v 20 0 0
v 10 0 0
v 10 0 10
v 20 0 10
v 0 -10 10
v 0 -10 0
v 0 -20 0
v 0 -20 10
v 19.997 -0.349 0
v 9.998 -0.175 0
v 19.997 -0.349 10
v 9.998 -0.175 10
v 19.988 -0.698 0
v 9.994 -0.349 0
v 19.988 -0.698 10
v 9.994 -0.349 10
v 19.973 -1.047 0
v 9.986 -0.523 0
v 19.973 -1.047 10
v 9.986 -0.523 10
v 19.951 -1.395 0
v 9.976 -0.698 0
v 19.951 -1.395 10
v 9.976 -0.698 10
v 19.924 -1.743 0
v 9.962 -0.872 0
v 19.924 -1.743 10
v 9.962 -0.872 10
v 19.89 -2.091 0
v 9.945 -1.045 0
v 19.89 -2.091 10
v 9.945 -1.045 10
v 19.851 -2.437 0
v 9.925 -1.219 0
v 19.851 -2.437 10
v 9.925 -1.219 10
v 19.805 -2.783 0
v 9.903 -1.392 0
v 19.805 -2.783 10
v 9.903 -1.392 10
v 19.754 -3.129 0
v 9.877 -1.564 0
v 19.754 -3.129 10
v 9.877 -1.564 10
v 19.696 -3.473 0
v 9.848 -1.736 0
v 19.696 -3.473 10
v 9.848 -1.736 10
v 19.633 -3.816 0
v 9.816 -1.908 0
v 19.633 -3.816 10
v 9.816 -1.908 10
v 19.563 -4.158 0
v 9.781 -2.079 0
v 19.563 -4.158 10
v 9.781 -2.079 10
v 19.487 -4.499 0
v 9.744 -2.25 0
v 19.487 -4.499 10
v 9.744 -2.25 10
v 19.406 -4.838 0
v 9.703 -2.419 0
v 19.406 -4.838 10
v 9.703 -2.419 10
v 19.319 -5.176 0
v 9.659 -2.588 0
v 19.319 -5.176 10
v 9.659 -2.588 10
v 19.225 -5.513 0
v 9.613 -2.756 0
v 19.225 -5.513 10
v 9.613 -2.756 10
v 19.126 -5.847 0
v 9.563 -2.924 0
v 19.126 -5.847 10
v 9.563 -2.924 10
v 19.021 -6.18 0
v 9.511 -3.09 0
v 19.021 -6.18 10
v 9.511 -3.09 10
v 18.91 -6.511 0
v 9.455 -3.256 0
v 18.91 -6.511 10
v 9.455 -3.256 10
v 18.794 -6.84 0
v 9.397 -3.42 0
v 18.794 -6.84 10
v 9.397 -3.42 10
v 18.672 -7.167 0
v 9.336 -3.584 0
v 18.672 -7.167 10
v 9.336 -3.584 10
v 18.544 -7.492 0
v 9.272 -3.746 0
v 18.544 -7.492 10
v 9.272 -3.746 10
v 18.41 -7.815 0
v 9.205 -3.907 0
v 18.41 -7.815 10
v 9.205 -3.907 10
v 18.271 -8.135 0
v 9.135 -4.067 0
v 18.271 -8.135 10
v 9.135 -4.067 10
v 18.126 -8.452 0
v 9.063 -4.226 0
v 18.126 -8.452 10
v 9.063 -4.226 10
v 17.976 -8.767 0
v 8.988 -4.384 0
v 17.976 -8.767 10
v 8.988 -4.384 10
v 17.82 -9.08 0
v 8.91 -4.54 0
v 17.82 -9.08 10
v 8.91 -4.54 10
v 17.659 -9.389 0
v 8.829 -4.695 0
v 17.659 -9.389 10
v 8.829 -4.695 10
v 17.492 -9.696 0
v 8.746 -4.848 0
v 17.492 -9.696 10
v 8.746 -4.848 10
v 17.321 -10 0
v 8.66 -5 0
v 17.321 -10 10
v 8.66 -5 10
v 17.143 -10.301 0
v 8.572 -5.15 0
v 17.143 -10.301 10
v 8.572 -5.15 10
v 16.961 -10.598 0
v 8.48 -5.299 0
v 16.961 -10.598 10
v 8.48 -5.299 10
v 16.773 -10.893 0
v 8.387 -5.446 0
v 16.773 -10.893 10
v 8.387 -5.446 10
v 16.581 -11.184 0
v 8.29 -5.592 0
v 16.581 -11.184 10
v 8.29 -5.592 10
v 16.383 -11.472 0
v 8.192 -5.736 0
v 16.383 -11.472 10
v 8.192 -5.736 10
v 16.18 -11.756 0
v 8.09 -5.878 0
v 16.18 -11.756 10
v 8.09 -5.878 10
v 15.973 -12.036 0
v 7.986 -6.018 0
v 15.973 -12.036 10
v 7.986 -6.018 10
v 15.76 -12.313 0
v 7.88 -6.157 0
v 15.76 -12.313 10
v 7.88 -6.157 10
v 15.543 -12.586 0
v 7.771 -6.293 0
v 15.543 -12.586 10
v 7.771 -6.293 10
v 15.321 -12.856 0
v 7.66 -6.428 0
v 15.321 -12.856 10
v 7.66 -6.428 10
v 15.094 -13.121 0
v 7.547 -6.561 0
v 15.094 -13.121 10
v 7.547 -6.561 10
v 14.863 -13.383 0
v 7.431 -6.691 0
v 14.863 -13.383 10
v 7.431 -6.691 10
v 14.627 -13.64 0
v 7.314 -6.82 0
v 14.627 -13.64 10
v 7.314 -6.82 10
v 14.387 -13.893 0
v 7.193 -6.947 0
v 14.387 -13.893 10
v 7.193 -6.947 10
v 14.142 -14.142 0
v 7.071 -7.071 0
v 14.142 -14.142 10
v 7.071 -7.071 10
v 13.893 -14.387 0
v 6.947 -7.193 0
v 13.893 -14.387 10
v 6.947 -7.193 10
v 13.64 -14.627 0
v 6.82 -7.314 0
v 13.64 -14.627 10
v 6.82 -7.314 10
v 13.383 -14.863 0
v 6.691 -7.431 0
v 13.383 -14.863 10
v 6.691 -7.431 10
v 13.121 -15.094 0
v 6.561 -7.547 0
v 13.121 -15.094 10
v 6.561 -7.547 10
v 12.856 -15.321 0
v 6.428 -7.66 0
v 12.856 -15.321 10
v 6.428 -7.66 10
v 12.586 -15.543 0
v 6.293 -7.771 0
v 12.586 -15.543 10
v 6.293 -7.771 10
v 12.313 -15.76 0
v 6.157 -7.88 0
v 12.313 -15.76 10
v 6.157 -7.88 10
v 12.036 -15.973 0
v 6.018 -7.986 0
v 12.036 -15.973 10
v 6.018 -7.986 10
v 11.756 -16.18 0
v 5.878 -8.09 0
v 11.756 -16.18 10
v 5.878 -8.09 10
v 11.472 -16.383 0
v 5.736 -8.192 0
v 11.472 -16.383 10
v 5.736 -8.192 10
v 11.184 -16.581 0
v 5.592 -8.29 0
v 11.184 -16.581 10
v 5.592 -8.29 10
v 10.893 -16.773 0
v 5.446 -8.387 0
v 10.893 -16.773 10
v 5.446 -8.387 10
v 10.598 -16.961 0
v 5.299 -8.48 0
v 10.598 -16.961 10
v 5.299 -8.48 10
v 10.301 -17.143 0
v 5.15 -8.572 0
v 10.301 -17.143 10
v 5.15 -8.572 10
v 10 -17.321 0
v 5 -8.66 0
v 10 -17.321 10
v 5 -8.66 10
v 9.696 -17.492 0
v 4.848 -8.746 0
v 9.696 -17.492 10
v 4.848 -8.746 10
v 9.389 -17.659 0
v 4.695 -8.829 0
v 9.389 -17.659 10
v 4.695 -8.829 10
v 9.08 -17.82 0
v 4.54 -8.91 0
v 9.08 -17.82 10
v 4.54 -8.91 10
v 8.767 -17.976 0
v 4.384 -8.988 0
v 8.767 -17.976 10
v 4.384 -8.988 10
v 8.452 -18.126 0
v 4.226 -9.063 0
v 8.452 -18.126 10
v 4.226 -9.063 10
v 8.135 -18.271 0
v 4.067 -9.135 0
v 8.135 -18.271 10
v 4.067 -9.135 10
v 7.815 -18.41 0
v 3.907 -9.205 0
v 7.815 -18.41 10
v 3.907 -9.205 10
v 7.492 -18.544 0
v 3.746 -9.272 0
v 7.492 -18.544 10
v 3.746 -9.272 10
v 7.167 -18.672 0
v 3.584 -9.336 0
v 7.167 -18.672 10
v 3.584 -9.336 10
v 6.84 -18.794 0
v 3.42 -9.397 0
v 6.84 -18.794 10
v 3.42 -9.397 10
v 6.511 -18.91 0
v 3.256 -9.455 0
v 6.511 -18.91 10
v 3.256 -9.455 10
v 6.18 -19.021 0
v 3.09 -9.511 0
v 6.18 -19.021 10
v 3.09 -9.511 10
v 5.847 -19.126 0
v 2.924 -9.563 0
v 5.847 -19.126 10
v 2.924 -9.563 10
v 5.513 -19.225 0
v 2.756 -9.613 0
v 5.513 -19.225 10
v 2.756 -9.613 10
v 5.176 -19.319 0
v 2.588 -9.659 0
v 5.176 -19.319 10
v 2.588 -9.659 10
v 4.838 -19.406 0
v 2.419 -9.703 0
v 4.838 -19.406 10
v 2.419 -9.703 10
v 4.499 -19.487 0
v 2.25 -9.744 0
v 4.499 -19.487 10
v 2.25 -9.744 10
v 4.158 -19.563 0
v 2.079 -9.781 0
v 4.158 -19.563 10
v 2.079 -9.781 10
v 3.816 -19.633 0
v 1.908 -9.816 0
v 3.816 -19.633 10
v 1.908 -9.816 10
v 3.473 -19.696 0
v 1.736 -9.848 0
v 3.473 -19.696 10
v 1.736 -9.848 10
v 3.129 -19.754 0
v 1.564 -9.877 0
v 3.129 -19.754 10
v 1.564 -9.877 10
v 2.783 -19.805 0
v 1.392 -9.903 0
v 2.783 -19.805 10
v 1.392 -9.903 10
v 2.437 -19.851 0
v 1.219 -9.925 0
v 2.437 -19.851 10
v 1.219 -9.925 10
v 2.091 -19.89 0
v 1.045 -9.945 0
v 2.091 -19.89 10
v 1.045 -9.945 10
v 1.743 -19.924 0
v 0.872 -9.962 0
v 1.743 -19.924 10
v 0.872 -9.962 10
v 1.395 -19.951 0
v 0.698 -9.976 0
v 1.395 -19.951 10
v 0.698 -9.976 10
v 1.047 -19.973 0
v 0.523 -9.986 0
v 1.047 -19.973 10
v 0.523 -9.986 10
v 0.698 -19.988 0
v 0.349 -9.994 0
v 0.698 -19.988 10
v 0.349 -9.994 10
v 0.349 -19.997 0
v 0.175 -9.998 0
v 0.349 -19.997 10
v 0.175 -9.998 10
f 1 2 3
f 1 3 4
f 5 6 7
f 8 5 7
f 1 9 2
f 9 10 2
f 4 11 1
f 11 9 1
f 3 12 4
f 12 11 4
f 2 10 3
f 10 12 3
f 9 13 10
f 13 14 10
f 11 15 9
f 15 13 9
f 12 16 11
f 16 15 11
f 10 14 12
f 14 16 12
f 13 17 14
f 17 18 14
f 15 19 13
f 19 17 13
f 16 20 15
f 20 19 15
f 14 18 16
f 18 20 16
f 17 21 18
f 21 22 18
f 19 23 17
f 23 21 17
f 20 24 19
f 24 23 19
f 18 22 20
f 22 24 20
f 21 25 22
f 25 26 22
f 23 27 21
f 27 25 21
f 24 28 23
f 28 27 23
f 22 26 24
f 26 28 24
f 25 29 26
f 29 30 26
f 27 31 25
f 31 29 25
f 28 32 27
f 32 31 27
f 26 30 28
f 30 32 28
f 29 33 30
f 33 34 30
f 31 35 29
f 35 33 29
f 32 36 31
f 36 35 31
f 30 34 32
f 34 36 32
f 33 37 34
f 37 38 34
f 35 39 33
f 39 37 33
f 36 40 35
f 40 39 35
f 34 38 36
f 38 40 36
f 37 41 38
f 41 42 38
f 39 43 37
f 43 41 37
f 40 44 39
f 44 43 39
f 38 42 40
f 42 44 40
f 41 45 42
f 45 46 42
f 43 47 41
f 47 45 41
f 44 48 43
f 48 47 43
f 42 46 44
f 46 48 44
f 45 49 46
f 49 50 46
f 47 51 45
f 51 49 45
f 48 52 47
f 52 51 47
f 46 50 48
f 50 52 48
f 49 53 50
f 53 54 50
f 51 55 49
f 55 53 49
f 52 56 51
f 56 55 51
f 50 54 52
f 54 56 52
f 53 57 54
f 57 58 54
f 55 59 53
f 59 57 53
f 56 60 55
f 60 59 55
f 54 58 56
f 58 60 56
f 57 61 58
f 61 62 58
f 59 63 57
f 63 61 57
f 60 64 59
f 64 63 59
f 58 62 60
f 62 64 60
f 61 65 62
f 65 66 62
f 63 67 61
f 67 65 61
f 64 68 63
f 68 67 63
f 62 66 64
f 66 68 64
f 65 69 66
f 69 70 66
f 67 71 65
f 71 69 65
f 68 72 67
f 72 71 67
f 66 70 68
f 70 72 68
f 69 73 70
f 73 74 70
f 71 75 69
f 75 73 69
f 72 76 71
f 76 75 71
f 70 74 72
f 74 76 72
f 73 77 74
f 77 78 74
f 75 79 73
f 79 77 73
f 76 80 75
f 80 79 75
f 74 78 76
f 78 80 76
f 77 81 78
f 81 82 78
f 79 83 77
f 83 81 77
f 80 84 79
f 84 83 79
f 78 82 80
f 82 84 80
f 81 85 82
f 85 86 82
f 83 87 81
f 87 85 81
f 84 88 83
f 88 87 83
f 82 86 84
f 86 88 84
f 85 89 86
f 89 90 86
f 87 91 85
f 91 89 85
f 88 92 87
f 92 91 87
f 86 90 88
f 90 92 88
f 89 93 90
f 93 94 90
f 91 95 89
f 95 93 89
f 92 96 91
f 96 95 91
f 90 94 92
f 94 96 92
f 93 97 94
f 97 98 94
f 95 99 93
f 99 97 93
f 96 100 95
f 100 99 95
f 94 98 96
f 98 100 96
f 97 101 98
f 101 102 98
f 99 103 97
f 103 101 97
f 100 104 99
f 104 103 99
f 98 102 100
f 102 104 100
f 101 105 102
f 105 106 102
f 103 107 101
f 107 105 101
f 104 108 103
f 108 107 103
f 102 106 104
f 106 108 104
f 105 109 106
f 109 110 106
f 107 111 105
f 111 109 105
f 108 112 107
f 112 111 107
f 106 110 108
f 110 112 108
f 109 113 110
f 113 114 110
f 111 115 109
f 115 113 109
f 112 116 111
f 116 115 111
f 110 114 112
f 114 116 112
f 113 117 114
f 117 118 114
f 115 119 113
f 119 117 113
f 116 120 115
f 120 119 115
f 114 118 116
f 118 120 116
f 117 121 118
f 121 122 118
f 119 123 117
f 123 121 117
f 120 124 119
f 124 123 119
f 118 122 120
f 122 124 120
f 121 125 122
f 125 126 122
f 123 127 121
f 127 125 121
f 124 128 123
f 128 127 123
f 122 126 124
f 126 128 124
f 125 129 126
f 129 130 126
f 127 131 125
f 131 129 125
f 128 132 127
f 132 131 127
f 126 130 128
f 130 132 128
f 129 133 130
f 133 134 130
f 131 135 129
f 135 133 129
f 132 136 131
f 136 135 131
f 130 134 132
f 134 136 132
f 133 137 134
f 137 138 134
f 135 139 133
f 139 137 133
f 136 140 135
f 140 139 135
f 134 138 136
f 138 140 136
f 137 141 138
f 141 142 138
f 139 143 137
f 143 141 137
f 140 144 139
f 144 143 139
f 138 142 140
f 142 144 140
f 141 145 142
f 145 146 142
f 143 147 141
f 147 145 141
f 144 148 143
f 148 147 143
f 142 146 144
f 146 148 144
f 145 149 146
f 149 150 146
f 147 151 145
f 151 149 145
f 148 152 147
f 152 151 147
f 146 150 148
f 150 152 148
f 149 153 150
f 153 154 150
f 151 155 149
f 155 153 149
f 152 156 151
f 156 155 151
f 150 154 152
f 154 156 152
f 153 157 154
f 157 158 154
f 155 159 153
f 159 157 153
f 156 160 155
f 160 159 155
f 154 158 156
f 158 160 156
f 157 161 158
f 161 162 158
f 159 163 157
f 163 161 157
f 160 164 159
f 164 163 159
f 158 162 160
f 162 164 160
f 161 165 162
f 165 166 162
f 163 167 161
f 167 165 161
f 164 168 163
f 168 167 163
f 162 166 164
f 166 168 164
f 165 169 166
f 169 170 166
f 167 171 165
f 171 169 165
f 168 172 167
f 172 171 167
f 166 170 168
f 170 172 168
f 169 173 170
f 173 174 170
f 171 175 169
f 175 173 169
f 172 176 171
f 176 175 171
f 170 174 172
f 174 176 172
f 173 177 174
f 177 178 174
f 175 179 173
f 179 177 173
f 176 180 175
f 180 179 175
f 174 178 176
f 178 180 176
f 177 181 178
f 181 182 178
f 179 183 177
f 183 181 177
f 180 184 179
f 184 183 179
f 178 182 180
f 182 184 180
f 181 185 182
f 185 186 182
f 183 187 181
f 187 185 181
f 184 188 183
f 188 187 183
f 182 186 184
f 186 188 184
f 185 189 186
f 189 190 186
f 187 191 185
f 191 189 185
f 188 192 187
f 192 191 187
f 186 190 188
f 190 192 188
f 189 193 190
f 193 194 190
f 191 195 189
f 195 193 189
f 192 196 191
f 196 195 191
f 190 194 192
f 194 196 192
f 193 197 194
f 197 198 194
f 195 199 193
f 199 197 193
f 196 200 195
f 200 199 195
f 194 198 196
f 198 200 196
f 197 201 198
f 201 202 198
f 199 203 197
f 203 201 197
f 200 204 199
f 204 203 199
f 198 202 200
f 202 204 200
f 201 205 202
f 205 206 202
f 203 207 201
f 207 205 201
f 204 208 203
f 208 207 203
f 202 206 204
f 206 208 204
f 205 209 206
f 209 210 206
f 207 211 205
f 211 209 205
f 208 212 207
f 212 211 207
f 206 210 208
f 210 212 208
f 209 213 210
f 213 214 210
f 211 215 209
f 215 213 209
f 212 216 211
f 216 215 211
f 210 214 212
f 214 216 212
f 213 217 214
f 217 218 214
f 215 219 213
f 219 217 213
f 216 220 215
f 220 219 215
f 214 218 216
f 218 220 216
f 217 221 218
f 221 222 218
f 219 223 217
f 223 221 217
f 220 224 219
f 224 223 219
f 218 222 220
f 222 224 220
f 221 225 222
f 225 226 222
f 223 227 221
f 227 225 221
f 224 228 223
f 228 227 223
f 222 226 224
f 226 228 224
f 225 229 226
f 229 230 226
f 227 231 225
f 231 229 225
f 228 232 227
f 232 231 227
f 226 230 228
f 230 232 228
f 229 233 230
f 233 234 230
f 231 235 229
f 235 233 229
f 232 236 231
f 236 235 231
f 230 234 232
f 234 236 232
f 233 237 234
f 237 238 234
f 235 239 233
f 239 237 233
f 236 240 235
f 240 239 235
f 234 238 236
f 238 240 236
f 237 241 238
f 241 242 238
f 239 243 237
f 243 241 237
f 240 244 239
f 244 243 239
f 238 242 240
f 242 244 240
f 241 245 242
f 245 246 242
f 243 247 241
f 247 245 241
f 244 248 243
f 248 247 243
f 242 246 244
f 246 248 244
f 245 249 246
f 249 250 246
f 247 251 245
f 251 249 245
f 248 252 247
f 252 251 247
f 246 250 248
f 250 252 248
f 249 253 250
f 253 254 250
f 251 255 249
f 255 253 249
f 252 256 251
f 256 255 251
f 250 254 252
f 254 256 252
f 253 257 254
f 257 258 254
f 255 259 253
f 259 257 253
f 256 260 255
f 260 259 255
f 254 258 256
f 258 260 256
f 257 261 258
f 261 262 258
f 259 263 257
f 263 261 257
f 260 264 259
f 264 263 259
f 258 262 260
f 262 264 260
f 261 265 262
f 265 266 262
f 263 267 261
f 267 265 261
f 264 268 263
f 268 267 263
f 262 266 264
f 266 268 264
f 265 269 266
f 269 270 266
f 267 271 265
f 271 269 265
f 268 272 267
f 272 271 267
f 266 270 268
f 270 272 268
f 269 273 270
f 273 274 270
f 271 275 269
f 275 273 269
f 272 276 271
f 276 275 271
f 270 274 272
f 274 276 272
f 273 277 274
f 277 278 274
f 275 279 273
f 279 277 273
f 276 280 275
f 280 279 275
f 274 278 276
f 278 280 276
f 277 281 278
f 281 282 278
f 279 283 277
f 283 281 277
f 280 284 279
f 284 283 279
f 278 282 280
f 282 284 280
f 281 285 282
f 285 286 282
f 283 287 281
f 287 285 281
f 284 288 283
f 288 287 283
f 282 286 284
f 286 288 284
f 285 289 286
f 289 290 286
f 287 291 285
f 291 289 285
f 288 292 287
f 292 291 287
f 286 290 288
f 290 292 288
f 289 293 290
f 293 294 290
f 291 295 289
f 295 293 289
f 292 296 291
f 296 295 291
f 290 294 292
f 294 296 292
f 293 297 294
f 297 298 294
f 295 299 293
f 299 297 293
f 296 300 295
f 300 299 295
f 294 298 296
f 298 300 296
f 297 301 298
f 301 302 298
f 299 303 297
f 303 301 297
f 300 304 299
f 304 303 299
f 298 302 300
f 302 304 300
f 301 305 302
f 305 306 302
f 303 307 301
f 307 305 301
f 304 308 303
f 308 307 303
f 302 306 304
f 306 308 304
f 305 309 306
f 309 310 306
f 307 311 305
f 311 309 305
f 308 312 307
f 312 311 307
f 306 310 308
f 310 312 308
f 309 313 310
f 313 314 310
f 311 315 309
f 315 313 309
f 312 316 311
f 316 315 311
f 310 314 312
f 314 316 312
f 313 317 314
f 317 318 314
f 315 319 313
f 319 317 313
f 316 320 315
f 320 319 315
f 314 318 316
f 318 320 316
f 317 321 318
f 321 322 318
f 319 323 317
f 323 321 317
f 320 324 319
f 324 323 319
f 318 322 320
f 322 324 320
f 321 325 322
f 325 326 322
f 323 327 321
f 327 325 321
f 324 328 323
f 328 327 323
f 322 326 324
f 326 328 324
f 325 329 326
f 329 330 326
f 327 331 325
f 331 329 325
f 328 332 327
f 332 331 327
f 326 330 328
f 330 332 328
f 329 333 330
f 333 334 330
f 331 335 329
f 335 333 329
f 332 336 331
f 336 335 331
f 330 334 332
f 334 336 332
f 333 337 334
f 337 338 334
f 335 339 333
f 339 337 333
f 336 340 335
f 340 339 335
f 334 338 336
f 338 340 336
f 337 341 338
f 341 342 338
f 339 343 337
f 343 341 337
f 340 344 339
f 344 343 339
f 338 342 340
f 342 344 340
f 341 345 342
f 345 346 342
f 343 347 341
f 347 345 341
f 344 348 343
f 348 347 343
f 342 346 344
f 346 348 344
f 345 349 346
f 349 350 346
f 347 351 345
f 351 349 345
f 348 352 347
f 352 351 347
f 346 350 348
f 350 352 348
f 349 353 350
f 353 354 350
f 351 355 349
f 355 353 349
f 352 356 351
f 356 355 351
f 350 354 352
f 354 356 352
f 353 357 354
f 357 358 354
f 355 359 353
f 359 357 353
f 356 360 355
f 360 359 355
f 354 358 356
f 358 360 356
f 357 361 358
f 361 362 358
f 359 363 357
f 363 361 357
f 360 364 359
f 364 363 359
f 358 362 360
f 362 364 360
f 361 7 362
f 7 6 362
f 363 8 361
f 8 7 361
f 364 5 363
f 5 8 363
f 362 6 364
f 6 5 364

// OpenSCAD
rotate_extrude(angle=-90, $fn=360) translate([10,0]) square([10,10]);
